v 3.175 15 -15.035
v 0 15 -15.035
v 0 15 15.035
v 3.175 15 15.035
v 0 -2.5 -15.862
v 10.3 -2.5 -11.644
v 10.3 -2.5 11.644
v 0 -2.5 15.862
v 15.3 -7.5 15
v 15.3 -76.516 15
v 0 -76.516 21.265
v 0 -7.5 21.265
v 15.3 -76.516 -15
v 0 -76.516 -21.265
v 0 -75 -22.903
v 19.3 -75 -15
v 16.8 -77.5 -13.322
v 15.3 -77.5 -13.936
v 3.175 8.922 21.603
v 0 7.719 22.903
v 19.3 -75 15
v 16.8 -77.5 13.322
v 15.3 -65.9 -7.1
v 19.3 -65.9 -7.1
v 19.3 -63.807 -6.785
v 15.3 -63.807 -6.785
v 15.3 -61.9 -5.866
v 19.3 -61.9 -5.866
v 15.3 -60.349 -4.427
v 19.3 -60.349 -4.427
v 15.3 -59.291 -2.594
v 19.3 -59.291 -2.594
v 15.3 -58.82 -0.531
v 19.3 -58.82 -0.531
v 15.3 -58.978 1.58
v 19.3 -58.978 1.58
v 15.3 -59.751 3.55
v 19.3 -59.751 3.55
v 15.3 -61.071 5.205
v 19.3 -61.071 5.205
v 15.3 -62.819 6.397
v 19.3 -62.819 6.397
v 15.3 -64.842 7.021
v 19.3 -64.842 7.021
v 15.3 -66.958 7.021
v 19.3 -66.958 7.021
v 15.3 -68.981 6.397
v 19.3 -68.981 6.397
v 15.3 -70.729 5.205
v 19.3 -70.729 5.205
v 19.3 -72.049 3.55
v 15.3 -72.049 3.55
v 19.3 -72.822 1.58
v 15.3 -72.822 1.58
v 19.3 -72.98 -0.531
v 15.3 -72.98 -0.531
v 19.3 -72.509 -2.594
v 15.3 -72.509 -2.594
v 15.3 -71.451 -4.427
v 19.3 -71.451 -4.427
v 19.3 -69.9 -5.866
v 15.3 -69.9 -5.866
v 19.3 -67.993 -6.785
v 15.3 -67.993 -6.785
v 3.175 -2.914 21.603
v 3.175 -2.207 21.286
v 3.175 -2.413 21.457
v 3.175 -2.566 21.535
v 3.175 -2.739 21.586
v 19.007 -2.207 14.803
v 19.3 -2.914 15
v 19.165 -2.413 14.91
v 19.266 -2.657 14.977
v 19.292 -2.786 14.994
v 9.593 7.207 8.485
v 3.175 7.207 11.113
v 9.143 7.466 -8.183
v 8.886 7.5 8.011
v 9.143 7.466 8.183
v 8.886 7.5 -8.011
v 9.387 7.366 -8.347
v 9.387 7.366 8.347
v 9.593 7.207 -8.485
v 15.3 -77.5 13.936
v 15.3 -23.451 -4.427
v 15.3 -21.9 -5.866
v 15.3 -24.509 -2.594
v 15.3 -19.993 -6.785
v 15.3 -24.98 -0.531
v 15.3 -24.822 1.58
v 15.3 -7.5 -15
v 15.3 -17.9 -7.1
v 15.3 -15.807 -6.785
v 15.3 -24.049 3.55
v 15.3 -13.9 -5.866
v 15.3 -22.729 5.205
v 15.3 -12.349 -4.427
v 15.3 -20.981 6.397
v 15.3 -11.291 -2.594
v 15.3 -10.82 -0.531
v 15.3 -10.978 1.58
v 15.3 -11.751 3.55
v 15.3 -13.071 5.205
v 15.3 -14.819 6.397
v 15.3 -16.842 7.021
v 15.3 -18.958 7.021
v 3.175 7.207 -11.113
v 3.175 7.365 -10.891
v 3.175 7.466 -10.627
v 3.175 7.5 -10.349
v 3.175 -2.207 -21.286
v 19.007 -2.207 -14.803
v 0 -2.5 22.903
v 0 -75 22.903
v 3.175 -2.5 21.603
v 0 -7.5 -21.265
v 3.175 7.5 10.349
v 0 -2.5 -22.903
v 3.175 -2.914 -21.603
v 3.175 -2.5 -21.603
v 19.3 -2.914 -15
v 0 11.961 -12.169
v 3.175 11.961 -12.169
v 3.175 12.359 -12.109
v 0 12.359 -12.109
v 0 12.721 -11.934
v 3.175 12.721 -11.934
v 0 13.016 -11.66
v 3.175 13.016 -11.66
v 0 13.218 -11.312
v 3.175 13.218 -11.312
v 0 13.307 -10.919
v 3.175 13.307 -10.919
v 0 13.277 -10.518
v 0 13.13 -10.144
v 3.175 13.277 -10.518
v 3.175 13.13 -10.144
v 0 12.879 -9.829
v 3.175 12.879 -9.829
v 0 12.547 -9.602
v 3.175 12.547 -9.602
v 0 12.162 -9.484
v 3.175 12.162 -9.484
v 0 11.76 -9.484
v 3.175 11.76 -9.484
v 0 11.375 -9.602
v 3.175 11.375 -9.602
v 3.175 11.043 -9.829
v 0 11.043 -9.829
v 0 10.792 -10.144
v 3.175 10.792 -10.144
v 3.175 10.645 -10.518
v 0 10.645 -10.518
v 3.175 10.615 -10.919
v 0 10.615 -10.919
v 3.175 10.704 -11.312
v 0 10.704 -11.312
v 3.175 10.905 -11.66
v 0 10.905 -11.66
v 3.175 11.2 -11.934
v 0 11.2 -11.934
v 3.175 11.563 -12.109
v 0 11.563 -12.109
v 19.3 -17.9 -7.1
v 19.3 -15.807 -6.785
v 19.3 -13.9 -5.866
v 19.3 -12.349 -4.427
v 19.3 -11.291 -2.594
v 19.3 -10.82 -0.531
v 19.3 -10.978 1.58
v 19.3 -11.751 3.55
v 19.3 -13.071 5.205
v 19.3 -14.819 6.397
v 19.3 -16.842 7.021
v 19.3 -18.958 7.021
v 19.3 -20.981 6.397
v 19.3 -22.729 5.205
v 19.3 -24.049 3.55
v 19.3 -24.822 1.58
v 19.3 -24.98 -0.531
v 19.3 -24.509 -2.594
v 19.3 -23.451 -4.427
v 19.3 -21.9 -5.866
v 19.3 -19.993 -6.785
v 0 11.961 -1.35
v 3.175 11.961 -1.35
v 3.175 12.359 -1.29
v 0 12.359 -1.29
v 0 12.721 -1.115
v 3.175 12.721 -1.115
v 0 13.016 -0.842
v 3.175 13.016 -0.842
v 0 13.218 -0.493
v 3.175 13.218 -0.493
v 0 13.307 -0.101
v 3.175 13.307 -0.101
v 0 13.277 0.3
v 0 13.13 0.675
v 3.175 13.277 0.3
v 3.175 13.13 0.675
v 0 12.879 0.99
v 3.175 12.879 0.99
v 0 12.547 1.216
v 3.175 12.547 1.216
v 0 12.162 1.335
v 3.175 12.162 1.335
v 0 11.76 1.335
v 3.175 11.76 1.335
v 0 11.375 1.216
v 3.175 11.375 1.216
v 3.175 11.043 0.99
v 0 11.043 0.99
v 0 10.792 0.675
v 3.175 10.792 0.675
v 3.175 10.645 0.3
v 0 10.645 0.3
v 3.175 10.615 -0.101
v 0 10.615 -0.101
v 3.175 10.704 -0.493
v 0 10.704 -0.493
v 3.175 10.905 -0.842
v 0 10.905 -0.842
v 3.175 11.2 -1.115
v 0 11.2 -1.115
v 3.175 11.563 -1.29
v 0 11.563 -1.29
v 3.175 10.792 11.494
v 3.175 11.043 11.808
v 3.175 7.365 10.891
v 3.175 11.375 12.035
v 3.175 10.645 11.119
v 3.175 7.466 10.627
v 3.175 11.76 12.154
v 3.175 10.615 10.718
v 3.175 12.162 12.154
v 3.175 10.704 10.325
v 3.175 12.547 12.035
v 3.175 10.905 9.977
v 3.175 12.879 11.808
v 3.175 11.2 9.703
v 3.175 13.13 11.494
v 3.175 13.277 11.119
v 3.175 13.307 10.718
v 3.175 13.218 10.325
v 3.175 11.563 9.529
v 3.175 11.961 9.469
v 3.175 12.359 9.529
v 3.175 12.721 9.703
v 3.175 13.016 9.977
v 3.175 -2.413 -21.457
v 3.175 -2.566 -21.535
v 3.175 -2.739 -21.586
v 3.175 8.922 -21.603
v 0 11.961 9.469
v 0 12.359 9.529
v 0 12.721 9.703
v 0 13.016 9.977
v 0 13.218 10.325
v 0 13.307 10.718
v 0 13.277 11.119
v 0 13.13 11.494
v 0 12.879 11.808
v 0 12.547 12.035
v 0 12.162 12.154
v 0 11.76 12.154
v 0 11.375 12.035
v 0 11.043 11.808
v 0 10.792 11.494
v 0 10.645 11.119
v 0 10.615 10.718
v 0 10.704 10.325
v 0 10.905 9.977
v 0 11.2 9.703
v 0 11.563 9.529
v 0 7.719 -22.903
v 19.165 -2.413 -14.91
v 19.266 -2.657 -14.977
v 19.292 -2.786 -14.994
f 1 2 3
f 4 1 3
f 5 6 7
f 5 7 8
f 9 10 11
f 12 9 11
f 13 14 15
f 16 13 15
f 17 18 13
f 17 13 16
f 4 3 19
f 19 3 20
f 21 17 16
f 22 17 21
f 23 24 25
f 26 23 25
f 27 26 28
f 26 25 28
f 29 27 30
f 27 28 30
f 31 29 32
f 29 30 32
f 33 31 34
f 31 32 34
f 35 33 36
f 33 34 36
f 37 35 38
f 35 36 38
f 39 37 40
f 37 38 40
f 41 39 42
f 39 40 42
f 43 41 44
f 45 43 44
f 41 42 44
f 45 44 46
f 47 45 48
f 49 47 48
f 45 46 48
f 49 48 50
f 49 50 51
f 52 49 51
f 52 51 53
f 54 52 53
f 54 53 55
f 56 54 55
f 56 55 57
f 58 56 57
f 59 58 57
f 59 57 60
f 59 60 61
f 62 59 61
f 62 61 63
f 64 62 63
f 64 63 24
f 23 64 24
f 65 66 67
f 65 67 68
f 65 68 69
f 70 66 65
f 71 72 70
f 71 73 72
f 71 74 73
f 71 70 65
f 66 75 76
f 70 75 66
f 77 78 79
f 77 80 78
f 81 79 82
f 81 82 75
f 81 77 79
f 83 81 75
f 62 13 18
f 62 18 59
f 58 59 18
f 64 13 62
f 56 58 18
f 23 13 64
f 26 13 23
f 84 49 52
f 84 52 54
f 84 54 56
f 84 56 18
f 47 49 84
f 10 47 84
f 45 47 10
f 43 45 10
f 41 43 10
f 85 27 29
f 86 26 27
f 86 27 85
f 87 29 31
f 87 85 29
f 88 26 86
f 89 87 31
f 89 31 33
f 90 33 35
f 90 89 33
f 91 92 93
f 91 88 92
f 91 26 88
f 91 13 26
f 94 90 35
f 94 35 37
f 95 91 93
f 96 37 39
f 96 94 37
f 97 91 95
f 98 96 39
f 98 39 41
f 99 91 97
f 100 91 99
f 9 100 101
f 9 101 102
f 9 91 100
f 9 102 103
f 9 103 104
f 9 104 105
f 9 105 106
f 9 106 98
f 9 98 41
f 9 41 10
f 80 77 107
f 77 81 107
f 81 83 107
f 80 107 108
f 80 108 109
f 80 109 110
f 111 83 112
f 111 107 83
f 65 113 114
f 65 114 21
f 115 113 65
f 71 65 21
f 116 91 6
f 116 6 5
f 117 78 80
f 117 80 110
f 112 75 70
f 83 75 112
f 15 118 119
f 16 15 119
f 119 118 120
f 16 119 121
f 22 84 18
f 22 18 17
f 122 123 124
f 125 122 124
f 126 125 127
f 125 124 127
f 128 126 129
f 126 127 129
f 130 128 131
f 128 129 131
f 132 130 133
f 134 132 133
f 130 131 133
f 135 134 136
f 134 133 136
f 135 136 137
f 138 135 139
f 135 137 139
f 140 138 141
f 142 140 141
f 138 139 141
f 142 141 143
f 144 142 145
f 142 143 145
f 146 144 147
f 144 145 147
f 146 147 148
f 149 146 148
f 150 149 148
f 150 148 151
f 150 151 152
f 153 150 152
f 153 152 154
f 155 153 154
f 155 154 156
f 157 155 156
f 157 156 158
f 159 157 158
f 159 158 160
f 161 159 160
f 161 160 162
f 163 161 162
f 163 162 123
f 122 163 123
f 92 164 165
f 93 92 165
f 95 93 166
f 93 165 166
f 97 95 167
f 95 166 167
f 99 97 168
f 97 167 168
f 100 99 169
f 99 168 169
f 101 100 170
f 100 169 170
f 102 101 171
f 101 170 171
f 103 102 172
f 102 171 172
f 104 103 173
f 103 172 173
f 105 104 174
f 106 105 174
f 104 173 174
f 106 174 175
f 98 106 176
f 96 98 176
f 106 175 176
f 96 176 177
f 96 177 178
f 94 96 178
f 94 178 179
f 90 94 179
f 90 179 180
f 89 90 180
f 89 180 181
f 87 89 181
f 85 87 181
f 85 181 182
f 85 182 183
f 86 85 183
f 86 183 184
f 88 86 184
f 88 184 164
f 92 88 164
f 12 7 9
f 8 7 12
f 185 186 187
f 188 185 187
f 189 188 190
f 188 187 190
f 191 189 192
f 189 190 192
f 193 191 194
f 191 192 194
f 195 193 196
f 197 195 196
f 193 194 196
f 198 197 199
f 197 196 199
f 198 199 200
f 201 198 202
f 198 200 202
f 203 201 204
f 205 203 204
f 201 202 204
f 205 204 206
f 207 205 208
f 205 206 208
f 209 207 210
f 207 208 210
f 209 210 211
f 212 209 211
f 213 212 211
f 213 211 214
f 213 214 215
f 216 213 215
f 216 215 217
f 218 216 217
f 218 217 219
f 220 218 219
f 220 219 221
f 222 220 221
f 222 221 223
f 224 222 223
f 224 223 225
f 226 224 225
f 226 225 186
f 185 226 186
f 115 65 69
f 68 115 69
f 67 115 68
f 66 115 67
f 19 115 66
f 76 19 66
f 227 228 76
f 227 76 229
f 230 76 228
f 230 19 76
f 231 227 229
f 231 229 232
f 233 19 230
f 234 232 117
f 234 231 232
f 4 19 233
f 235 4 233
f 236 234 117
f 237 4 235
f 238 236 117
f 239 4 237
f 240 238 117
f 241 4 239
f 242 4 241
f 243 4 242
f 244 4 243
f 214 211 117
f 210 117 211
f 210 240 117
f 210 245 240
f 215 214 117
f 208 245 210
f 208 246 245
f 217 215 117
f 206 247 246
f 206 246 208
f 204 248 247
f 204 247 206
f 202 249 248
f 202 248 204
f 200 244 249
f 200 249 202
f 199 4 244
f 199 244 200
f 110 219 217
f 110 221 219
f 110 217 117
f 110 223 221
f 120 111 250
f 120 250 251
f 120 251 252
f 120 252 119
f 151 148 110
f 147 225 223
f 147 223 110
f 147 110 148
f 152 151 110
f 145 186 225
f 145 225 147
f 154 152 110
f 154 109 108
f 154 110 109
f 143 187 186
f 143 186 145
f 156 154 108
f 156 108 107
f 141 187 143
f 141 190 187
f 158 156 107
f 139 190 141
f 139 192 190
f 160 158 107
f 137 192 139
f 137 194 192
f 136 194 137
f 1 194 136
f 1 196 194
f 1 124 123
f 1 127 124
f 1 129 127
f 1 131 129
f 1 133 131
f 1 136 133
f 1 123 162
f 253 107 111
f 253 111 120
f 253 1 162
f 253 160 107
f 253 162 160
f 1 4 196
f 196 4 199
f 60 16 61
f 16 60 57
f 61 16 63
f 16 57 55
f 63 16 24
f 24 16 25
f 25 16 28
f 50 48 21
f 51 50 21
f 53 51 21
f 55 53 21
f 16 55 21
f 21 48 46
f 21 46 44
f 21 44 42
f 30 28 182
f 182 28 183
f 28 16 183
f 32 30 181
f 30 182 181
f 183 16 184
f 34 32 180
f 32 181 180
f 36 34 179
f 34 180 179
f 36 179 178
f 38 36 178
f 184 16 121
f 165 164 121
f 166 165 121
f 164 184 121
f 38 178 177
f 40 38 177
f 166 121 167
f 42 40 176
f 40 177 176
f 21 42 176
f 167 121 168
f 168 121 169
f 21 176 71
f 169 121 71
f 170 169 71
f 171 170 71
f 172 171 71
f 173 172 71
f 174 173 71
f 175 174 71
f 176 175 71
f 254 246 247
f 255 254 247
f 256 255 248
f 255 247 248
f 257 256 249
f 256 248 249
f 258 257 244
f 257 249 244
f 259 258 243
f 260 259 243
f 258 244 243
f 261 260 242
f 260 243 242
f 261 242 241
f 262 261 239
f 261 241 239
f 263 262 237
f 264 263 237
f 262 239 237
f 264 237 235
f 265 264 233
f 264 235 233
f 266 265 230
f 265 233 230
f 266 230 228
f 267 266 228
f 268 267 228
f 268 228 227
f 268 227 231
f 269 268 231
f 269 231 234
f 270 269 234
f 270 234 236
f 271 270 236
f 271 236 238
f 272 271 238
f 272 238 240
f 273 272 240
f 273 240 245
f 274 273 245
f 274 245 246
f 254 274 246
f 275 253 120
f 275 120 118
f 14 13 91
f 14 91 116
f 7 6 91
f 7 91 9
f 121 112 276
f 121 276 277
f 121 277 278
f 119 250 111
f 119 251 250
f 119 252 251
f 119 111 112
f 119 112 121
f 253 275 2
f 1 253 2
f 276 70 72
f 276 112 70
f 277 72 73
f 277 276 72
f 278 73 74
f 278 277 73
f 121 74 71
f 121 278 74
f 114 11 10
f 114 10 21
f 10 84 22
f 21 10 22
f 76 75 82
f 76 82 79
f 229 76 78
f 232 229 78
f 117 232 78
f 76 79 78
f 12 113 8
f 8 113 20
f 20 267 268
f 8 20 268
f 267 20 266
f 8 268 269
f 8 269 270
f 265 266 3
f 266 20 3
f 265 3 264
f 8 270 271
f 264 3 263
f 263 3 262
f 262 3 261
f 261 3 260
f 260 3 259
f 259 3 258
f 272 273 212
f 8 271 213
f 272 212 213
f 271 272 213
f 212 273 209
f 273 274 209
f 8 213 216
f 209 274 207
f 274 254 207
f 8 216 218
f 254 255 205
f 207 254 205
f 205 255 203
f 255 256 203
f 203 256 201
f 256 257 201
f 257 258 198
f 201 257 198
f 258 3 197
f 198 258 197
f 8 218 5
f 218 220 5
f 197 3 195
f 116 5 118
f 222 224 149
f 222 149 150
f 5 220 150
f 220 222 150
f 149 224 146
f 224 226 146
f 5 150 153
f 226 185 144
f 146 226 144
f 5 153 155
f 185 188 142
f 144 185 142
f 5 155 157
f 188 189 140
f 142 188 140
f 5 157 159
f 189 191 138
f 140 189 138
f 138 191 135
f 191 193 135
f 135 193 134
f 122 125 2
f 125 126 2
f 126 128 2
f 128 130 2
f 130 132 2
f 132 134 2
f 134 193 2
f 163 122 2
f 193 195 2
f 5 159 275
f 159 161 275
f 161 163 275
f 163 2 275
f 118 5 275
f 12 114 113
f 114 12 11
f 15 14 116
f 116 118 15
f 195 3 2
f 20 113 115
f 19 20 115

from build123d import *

# Parameters (mm, degrees)
SKETCH1_W            = 30
SKETCH1_H            = 5
BOSS_EXTRUDE1_DEPTH  = 19.3
SKETCH2_W            = 40
SKETCH2_H            = 10
BOSS_EXTRUDE2_DEPTH  = 3.175
SKETCH3_W            = 4
SKETCH3_H            = 30
BOSS_EXTRUDE3_DEPTH  = 75
CUT_EXTRUDE1_REACH   = 84.48
SKETCH4_R            = 7.1
BOSS_EXTRUDE7_DEPTH  = 5
BOSS_EXTRUDE8_DEPTH  = 5
CHAMFER1_SIZE        = 5
BOSS_EXTRUDE9_DEPTH  = 75
BOSS_EXTRUDE10_DEPTH = 5
CHAMFER2_SIZE        = 5
CHAMFER3_SIZE        = 10
BOSS_EXTRUDE15_DEPTH = 3.175
CUT_EXTRUDE2_DEPTH   = 81.759021382
FILLET6_R            = 1
FILLET7_R            = 1
CHAMFER6_SIZE        = 2.5
SKETCH16_R           = 1.35
CUT_EXTRUDE3_DEPTH   = 83.406281069


with BuildPart() as part:
    # Sketch1 → Boss-Extrude1 (new body)
    with BuildSketch(Plane(origin=(0, 0, 0), x_dir=(0, 0, -1), z_dir=(1, 0, 0))):
        Rectangle(SKETCH1_W, SKETCH1_H)
    extrude(amount=BOSS_EXTRUDE1_DEPTH)

    # Sketch2 → Boss-Extrude2 (add)
    with BuildSketch(Plane.ZY):
        with Locations((0.597390222, 2.5)):
            Rectangle(SKETCH2_W, SKETCH2_H)
    extrude(amount=-BOSS_EXTRUDE2_DEPTH)

    # Sketch3 → Boss-Extrude3 (add)
    with BuildSketch(Plane.XZ.offset(2.5)):
        with Locations((17.3, 0)):
            Rectangle(SKETCH3_W, SKETCH3_H)
    extrude(amount=BOSS_EXTRUDE3_DEPTH)

    # Sketch4 → Cut-Extrude1 (cut, up to next)
    with BuildSketch(Plane(origin=(19.3, 0, 0), x_dir=(0, 0, -1), z_dir=(1, 0, 0)), mode=Mode.PRIVATE) as cut_extrude1_sk1:
        with Locations((2.035e-06, -17.9)):
            Circle(SKETCH4_R)
    cut_extrude1_tool1 = extrude(cut_extrude1_sk1.sketch, amount=-CUT_EXTRUDE1_REACH, mode=Mode.PRIVATE) & part.part
    # Sketch4 → Cut-Extrude1 (cut, up to next)
    with BuildSketch(Plane(origin=(19.3, 0, 0), x_dir=(0, 0, -1), z_dir=(1, 0, 0)), mode=Mode.PRIVATE) as cut_extrude1_sk2:
        with Locations((-1.3e-07, -65.9)):
            Circle(SKETCH4_R)
    cut_extrude1_tool2 = extrude(cut_extrude1_sk2.sketch, amount=-CUT_EXTRUDE1_REACH, mode=Mode.PRIVATE) & part.part
    add(cut_extrude1_tool1.solids().sort_by_distance((19.3, -17.9, -2e-06))[0], mode=Mode.SUBTRACT)
    add(cut_extrude1_tool2.solids().sort_by_distance((19.3, -65.9, 0))[0], mode=Mode.SUBTRACT)

    # Sketch10 → Boss-Extrude7 (add)
    with BuildSketch(Plane(origin=(0, 2.5, 0), x_dir=(1, 0, 0), z_dir=(0, 1, 0))):
        Polygon((3.175, 19.402609778), (0, 19.402609778), (0, 22.902609778), (19.3, 15), (3.175, 15), align=None)
    boss_extrude7 = extrude(amount=-BOSS_EXTRUDE7_DEPTH)

    # Sketch11 → Boss-Extrude8 (add)
    with BuildSketch(Plane(origin=(0, 2.5, 0), x_dir=(1, 0, 0), z_dir=(0, 1, 0))):
        Polygon((0, 19.402609778), (0, 22.902609778), (3.175, 21.60256905), (3.175, 19.402609778), align=None)
    boss_extrude8 = extrude(amount=BOSS_EXTRUDE8_DEPTH)

    # Mirror2: Boss-Extrude7, Boss-Extrude8 across plane
    add(boss_extrude7.mirror(Plane(origin=(0, 0, 0), x_dir=(1, 0, 0), z_dir=(0, 0, -1))))
    add(boss_extrude8.mirror(Plane(origin=(0, 0, 0), x_dir=(1, 0, 0), z_dir=(0, 0, -1))))

    # Chamfer1
    chamfer1_edges = [part.edges().sort_by_distance(p)[0] for p in [
        (3.175, 2.5, 0),
    ]]
    chamfer(chamfer1_edges, length=CHAMFER1_SIZE - 0.0001)  # a hair under: the kernel refuses the full size

    # Sketch12 → Boss-Extrude9 (add)
    with BuildSketch(Plane.XZ.offset(2.5)):
        Polygon((0, -22.902609778), (19.3, -15), (15.3, -15), (0, -21.264763192), align=None)
        Polygon((0, 22.902609778), (19.3, 15), (15.3, 15), (0, 21.264763192), align=None)
    extrude(amount=BOSS_EXTRUDE9_DEPTH)

    # Sketch13 → Boss-Extrude10 (add)
    with BuildSketch(Plane(origin=(0, 2.5, 0), x_dir=(1, 0, 0), z_dir=(0, 1, 0))):
        Polygon((3.175, 21.60256905), (3.175, -21.60256905), (19.3, -15), (19.3, 15), align=None)
    extrude(amount=BOSS_EXTRUDE10_DEPTH)

    # Chamfer2
    chamfer2_edges = [part.edges().sort_by_distance(p)[0] for p in [
        (7.65, -2.5, -18.132381596),
        (7.65, -2.5, 18.132381596),
        (15.3, -2.5, 0),
    ]]
    chamfer(chamfer2_edges, length=CHAMFER2_SIZE)

    # Chamfer3
    chamfer3_edges = [part.edges().sort_by_distance(p)[0] for p in [
        (9.65, 7.5, 18.951304889),
        (19.3, 7.5, 0),
        (9.65, 7.5, -18.951304889),
    ]]
    chamfer(chamfer3_edges, length=CHAMFER3_SIZE)

    # Sketch14 → Boss-Extrude15 (add)
    with BuildSketch(Plane.ZY):
        Polygon((-22.902609778, -2.5), (-22.902609778, 7.718772797), (-15.034642071, 15), (15.034642071, 15), (22.902609778, 7.718772797), (22.902609778, -2.5), align=None)
    extrude(amount=-BOSS_EXTRUDE15_DEPTH)

    # Sketch15 → Cut-Extrude2 (cut, through all)
    with BuildSketch(Plane.XZ.offset(2.5)):
        Polygon((3.175, 22.902609778), (0, 22.902609778), (3.175, 21.60256905), align=None)
        Polygon((3.175, -22.902609778), (3.175, -21.60256905), (0, -22.902609778), align=None)
    extrude(amount=-CUT_EXTRUDE2_DEPTH, mode=Mode.SUBTRACT)

    # Fillet6
    fillet6_edges = [part.edges().sort_by_distance(p)[0] for p in [
        (9.3, 7.5, 0),
        (6.2375, 7.5, -9.542766367),
        (6.2375, 7.5, 9.542766367),
    ]]
    fillet(fillet6_edges, radius=FILLET6_R)

    # Fillet7
    fillet7_edges = [part.edges().sort_by_distance(p)[0] for p in [
        (11.2375, -2.5, 18.301284525),
        (19.3, -2.5, 0),
        (11.2375, -2.5, -18.301284525),
    ]]
    fillet(fillet7_edges, radius=FILLET7_R)

    # Chamfer6
    chamfer6_edges = [part.edges().sort_by_distance(p)[0] for p in [
        (9.65, -77.5, -18.951304889),
        (19.3, -77.5, 0),
        (9.65, -77.5, 18.951304889),
    ]]
    chamfer(chamfer6_edges, length=CHAMFER6_SIZE)

    # Sketch16 → Cut-Extrude3 (cut, through all)
    with BuildSketch(Plane(origin=(3.175, 0, 0), x_dir=(0, 0, -1), z_dir=(1, 0, 0))):
        with Locations((0, 11.960932583)):
            Circle(SKETCH16_R)
        with Locations((-10.818605561, 11.960932583)):
            Circle(SKETCH16_R)
        with Locations((10.818605561, 11.960932583)):
            Circle(SKETCH16_R)
    extrude(amount=-CUT_EXTRUDE3_DEPTH, mode=Mode.SUBTRACT)


solid = part.part
